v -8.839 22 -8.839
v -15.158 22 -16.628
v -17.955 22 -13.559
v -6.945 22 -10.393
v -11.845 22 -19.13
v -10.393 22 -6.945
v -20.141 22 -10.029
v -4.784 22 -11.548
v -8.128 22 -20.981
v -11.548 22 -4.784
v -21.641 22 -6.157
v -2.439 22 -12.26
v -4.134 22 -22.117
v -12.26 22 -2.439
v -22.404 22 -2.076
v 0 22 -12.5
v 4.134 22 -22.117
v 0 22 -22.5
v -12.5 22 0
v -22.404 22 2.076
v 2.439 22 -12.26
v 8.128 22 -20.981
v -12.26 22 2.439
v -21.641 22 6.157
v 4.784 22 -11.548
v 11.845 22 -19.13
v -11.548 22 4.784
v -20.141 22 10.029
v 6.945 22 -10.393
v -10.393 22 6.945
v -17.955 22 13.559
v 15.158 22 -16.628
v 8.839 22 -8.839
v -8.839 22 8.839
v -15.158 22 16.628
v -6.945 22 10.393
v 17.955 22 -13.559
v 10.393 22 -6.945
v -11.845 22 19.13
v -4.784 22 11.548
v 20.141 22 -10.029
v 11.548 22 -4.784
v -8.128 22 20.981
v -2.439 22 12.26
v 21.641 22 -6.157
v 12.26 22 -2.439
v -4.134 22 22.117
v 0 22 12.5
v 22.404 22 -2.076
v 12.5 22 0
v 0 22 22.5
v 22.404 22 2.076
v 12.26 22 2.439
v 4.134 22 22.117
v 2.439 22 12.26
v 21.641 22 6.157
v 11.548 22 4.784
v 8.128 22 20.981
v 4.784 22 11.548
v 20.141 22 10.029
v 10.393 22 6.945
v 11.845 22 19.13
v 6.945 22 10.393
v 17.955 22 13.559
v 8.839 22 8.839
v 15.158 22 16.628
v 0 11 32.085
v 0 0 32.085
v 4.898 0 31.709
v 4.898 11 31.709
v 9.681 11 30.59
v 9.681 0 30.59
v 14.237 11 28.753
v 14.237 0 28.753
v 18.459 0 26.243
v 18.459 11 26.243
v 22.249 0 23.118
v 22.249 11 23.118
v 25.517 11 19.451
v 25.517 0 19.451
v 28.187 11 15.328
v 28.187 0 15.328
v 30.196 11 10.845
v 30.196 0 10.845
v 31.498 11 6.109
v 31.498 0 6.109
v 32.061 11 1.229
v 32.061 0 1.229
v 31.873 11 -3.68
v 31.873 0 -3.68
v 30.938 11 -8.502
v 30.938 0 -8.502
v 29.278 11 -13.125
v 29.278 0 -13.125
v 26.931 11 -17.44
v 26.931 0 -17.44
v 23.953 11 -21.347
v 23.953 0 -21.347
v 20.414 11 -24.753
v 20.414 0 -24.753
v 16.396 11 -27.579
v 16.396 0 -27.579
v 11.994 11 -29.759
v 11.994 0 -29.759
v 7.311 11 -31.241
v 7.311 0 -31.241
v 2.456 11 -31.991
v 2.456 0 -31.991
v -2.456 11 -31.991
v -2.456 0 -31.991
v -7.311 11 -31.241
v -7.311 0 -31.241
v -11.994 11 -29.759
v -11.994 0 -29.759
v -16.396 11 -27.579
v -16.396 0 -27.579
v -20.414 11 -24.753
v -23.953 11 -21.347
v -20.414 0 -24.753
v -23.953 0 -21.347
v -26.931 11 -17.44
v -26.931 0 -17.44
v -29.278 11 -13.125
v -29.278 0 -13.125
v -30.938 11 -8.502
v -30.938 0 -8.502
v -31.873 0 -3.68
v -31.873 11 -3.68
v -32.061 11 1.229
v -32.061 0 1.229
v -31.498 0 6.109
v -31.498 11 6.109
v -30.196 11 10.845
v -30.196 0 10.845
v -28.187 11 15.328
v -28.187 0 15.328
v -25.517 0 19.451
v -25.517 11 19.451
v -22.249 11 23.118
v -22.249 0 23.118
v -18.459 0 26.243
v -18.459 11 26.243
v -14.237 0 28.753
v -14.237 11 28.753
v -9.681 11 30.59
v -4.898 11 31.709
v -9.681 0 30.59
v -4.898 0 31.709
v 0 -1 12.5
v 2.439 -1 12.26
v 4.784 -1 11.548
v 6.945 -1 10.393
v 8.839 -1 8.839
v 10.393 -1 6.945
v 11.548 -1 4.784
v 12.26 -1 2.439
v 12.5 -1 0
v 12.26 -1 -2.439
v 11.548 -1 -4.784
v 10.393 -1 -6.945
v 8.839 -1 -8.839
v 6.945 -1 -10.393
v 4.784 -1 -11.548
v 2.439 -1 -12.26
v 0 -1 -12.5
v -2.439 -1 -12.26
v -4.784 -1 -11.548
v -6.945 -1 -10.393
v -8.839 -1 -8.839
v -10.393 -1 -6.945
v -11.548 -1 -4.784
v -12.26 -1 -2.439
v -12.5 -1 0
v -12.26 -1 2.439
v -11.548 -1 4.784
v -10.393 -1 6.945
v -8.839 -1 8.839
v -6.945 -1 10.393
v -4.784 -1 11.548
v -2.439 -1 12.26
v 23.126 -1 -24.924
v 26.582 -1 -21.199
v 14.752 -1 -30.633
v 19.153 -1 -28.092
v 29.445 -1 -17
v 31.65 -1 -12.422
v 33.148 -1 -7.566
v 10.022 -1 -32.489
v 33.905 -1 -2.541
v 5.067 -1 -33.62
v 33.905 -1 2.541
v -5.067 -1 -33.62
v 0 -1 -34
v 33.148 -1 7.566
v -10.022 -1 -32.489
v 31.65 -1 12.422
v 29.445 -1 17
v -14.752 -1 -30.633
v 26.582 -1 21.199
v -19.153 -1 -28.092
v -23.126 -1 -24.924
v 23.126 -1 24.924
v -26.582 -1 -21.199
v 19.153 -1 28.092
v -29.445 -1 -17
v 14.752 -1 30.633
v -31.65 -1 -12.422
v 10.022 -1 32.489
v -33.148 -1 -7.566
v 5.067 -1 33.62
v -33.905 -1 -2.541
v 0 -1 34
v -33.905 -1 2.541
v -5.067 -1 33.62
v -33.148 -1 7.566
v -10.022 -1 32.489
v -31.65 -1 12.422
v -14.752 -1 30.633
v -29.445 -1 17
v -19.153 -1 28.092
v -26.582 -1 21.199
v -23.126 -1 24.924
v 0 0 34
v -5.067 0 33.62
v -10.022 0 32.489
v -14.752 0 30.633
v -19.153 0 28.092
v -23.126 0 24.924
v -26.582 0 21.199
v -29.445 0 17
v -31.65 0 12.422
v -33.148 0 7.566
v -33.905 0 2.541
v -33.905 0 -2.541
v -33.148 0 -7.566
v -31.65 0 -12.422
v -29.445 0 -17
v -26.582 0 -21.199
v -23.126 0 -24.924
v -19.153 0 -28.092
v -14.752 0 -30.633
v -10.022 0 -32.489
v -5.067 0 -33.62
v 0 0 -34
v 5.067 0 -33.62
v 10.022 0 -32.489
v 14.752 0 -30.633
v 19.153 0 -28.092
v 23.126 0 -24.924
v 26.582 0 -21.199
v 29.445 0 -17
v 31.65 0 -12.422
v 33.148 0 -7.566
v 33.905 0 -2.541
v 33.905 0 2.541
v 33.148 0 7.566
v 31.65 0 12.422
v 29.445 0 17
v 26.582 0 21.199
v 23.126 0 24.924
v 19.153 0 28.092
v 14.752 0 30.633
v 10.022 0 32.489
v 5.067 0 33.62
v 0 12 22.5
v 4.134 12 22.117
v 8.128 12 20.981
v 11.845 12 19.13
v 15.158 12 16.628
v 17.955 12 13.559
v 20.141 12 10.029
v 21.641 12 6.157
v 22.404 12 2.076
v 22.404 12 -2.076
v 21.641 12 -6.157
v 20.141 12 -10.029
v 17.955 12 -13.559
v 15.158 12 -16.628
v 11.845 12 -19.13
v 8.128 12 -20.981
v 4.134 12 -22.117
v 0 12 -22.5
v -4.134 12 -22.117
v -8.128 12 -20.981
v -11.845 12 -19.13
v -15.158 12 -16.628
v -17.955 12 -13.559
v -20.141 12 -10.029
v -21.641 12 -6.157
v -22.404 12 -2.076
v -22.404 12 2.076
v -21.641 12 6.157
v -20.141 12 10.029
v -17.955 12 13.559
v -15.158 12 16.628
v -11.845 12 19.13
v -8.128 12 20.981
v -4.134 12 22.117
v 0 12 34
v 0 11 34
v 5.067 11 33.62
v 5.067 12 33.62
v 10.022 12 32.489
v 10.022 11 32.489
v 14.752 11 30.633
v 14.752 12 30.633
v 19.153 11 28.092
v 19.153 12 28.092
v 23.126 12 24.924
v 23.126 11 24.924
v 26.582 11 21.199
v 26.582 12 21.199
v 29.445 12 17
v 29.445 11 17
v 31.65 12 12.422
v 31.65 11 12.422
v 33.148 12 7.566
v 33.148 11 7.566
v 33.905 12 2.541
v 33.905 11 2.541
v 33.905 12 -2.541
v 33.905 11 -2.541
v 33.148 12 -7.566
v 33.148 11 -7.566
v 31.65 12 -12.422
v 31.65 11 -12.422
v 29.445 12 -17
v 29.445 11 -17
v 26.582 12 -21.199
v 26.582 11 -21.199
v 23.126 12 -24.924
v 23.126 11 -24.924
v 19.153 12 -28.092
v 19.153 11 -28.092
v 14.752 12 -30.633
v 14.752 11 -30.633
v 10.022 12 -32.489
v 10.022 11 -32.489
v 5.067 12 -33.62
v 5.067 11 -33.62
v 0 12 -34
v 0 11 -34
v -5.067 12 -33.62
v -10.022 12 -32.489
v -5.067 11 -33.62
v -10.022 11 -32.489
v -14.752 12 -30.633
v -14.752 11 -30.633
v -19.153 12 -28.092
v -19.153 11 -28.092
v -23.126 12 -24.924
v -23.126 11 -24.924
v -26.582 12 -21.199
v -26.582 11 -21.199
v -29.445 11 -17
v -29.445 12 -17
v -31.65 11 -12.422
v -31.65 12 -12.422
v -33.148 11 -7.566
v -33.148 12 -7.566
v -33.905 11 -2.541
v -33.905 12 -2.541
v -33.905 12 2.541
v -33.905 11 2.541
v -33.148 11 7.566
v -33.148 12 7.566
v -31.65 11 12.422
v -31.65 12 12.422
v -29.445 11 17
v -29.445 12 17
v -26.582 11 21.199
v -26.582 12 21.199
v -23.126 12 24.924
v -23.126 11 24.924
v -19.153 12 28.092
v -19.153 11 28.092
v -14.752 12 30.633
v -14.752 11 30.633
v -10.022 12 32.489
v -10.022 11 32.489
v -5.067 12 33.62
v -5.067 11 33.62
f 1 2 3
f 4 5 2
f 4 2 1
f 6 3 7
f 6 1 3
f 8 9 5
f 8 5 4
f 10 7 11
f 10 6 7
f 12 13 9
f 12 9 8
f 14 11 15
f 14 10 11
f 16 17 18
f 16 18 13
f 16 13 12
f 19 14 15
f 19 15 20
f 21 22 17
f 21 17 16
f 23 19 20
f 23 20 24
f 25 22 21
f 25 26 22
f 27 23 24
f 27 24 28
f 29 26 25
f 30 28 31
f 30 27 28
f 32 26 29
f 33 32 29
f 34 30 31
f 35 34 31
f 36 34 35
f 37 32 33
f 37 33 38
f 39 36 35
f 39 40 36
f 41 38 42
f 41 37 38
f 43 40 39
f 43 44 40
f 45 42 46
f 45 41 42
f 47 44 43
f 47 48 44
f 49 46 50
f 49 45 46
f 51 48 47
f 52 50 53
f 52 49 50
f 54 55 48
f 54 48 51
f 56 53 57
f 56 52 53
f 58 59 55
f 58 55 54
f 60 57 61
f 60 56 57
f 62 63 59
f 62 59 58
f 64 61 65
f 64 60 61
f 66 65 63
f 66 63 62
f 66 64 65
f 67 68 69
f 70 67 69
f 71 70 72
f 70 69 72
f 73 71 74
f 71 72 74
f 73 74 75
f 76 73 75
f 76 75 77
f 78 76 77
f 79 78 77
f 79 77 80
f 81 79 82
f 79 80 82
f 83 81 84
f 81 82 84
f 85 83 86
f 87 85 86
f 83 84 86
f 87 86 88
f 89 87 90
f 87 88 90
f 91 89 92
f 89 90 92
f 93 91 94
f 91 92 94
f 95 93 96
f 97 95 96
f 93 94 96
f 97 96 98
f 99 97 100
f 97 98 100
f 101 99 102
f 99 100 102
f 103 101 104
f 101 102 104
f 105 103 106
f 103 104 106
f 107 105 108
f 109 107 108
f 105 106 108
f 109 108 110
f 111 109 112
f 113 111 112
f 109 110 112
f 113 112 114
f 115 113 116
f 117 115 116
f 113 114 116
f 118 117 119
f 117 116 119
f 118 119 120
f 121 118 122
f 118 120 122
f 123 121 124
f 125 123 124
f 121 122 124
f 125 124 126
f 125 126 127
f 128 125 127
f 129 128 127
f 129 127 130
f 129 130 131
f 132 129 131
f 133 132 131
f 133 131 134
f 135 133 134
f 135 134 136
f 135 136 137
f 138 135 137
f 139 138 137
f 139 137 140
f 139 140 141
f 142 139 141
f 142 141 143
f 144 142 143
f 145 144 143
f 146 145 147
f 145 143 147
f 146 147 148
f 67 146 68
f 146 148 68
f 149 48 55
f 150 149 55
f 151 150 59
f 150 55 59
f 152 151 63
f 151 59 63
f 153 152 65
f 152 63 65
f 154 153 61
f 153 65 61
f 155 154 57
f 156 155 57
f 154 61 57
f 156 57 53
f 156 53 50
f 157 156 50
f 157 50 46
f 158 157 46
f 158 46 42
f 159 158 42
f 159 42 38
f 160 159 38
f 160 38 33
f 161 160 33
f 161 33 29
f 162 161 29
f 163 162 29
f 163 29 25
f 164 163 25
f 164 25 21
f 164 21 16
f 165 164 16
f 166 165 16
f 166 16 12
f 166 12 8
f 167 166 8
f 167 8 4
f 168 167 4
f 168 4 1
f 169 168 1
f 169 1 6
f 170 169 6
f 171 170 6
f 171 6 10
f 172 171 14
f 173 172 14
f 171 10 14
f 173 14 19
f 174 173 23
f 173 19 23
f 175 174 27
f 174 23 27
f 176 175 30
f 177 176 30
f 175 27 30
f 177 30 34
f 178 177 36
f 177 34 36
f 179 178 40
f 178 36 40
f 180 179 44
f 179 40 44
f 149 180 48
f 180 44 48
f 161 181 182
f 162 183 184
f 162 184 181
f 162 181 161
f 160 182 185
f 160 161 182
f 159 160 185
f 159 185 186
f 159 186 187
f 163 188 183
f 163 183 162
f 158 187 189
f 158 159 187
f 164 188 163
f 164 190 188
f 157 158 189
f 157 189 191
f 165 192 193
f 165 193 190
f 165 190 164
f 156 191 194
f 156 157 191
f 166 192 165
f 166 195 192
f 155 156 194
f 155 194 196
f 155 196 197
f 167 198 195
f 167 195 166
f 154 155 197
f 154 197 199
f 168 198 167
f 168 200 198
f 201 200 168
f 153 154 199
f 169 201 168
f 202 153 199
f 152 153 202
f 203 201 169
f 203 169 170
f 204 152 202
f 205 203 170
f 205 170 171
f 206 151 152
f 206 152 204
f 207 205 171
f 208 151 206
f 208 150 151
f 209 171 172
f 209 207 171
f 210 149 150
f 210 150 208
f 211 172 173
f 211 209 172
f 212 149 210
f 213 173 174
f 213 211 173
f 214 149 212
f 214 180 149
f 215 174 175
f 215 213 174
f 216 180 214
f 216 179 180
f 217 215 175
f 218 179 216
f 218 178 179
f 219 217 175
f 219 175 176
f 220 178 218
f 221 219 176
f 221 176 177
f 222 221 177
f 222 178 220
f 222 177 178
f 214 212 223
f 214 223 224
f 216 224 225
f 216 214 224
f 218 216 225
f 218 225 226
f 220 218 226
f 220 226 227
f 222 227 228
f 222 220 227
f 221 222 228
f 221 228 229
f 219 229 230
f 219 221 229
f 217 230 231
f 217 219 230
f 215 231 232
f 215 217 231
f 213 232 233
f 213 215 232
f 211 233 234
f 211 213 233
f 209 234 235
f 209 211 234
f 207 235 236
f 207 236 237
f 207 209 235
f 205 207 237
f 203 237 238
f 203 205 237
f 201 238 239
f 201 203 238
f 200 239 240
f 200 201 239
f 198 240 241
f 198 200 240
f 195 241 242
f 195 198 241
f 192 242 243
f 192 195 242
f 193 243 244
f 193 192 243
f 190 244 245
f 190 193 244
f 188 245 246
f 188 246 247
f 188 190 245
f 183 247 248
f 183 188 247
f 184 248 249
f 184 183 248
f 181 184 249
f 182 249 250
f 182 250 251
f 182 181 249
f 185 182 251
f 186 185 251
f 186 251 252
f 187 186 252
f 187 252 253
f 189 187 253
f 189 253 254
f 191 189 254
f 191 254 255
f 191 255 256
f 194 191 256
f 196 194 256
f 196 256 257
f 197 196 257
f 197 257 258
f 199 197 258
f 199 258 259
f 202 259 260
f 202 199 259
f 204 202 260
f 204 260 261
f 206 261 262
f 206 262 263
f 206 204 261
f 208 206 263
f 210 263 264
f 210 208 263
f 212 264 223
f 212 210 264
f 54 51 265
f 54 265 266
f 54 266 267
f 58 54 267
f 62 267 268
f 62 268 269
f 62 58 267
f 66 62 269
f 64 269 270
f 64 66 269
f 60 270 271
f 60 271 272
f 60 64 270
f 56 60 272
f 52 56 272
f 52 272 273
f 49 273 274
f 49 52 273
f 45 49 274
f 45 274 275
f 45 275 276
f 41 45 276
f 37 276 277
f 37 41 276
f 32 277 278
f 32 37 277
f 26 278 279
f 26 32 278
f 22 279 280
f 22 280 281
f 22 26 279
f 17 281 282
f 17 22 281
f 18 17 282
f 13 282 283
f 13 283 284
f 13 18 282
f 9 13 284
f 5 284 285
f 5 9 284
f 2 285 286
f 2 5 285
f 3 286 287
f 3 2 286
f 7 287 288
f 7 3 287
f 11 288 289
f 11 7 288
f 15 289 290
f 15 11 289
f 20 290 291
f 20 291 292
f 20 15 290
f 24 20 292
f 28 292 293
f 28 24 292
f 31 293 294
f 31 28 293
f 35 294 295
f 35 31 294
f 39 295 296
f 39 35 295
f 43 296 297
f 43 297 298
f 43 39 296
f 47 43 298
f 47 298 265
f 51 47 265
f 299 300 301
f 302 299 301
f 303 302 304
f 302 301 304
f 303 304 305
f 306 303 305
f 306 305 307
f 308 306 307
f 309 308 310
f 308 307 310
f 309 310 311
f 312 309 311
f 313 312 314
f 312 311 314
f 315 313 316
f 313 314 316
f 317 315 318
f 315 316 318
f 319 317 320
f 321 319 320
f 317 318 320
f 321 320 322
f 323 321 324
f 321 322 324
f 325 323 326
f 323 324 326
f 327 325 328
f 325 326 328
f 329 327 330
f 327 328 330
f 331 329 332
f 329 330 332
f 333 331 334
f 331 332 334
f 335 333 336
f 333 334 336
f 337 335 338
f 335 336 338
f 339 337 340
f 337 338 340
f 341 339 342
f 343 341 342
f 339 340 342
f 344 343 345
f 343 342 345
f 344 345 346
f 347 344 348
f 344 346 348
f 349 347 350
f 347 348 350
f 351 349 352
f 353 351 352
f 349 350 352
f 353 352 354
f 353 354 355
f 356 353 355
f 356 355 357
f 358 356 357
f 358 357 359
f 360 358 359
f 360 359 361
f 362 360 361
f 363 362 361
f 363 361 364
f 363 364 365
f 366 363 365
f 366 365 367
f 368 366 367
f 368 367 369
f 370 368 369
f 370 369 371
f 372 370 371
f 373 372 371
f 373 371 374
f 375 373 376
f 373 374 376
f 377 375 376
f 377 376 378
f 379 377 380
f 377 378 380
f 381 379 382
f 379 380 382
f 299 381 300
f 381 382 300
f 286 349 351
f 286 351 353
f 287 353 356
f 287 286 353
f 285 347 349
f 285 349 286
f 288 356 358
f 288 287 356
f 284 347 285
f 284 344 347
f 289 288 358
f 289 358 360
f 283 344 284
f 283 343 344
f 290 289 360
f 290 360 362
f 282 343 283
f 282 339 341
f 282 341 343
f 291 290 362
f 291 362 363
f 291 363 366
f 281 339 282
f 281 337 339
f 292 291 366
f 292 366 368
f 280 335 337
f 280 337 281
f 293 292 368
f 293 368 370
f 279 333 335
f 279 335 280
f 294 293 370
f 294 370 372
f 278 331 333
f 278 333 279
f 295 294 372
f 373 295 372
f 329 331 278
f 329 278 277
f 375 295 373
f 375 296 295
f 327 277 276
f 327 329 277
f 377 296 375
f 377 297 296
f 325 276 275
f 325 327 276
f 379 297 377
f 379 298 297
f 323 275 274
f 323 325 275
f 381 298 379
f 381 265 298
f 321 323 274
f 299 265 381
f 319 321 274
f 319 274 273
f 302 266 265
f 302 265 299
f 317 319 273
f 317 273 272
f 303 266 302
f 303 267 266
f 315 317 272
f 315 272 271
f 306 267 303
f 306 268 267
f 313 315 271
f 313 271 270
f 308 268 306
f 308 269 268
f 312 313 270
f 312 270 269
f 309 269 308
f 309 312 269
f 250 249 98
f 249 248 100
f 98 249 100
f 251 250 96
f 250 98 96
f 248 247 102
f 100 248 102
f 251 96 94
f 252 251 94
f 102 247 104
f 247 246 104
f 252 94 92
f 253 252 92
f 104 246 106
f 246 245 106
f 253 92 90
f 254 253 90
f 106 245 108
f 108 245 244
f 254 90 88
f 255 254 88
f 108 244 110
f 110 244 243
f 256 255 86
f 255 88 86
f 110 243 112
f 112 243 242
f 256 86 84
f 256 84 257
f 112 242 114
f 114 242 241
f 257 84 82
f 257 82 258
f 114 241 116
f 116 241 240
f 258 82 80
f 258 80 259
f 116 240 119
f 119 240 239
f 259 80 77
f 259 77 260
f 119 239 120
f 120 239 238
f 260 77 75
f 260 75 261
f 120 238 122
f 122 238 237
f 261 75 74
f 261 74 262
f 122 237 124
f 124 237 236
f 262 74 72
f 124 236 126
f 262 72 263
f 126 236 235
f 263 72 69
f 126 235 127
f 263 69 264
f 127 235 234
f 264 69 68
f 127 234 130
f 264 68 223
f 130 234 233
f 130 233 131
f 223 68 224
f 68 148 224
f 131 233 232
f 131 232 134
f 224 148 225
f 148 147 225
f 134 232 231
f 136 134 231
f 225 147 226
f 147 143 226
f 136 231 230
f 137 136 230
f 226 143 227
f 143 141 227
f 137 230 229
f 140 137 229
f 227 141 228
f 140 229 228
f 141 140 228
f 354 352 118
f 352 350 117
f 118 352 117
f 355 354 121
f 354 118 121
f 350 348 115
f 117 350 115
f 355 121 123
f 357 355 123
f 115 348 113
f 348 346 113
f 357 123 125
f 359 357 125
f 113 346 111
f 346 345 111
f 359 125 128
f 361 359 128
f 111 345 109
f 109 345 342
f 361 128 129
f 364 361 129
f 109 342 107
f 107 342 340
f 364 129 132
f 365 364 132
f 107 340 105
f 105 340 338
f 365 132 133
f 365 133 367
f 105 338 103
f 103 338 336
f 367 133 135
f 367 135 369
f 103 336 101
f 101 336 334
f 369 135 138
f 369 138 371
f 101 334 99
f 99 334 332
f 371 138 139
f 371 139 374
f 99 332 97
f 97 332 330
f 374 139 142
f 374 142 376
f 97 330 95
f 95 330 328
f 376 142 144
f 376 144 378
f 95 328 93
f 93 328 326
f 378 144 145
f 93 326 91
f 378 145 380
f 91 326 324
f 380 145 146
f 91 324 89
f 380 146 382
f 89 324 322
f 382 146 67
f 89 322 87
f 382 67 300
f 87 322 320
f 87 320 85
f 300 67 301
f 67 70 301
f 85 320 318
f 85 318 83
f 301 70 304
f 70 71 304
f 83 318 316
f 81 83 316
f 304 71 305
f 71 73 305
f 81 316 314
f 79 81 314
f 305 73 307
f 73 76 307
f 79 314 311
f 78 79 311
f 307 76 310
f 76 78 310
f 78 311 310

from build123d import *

# Parameters (mm, degrees)
SKETCH_1_R          = 32.085
EXTRUDE_1_DEPTH     = 11
SKETCH_2_R          = 34
EXTRUDE_2_DEPTH     = 1
EXTRUDE_START       = 1
SKETCH_3_R          = 34
EXTRUDE_3_DEPTH     = 1
SKETCH_4_R          = 12.5
CUT_EXTRUDE_1_DEPTH = 50.809637622
EXTRUDE_START_2     = 10
SKETCH_5_R          = 22.5
SKETCH_5_R_2        = 12.5
EXTRUDE_4_DEPTH     = 10


with BuildPart() as part:
    # 草图1 → 凸台-拉伸1 (new body)
    with BuildSketch(Plane(origin=(0, 0, 0), x_dir=(1, 0, 0), z_dir=(0, 1, 0))):
        with Locations(Location((0, 0, 0), (0, 0, 270))):
            Circle(SKETCH_1_R)
    extrude(amount=EXTRUDE_1_DEPTH)

    # 草图2 → 凸台-拉伸2 (add)
    with BuildSketch(Plane(origin=(0, 11, 0), x_dir=(1, 0, 0), z_dir=(0, 1, 0))):
        with Locations(Location((0, 0, 0), (0, 0, 270))):
            Circle(SKETCH_2_R)
    extrude(amount=EXTRUDE_2_DEPTH)

    # 草图3 → 凸台-拉伸3 (add)
    with BuildSketch(Plane.XZ.offset(EXTRUDE_START)):
        with Locations(Location((0, 0, 0), (0, 0, 90))):
            Circle(SKETCH_3_R)
    extrude(amount=-EXTRUDE_3_DEPTH)

    # 草图4 → 切除-拉伸1 (cut, through all)
    with BuildSketch(Plane(origin=(0, 12, 0), x_dir=(1, 0, 0), z_dir=(0, 1, 0))):
        with Locations(Location((0, 0, 0), (0, 0, 270))):
            Circle(SKETCH_4_R)
    extrude(amount=-CUT_EXTRUDE_1_DEPTH, mode=Mode.SUBTRACT)

    # 草图5 → 凸台-拉伸4 (add)
    with BuildSketch(Plane(origin=(0, 12, 0), x_dir=(1, 0, 0), z_dir=(0, 1, 0)).offset(EXTRUDE_START_2)):
        with Locations(Location((0, 0, 0), (0, 0, 270))):
            Circle(SKETCH_5_R)
        with Locations(Location((0, 0, 0), (0, 0, 270))):
            Circle(SKETCH_5_R_2, mode=Mode.SUBTRACT)
    extrude(amount=-EXTRUDE_4_DEPTH)


solid = part.part
